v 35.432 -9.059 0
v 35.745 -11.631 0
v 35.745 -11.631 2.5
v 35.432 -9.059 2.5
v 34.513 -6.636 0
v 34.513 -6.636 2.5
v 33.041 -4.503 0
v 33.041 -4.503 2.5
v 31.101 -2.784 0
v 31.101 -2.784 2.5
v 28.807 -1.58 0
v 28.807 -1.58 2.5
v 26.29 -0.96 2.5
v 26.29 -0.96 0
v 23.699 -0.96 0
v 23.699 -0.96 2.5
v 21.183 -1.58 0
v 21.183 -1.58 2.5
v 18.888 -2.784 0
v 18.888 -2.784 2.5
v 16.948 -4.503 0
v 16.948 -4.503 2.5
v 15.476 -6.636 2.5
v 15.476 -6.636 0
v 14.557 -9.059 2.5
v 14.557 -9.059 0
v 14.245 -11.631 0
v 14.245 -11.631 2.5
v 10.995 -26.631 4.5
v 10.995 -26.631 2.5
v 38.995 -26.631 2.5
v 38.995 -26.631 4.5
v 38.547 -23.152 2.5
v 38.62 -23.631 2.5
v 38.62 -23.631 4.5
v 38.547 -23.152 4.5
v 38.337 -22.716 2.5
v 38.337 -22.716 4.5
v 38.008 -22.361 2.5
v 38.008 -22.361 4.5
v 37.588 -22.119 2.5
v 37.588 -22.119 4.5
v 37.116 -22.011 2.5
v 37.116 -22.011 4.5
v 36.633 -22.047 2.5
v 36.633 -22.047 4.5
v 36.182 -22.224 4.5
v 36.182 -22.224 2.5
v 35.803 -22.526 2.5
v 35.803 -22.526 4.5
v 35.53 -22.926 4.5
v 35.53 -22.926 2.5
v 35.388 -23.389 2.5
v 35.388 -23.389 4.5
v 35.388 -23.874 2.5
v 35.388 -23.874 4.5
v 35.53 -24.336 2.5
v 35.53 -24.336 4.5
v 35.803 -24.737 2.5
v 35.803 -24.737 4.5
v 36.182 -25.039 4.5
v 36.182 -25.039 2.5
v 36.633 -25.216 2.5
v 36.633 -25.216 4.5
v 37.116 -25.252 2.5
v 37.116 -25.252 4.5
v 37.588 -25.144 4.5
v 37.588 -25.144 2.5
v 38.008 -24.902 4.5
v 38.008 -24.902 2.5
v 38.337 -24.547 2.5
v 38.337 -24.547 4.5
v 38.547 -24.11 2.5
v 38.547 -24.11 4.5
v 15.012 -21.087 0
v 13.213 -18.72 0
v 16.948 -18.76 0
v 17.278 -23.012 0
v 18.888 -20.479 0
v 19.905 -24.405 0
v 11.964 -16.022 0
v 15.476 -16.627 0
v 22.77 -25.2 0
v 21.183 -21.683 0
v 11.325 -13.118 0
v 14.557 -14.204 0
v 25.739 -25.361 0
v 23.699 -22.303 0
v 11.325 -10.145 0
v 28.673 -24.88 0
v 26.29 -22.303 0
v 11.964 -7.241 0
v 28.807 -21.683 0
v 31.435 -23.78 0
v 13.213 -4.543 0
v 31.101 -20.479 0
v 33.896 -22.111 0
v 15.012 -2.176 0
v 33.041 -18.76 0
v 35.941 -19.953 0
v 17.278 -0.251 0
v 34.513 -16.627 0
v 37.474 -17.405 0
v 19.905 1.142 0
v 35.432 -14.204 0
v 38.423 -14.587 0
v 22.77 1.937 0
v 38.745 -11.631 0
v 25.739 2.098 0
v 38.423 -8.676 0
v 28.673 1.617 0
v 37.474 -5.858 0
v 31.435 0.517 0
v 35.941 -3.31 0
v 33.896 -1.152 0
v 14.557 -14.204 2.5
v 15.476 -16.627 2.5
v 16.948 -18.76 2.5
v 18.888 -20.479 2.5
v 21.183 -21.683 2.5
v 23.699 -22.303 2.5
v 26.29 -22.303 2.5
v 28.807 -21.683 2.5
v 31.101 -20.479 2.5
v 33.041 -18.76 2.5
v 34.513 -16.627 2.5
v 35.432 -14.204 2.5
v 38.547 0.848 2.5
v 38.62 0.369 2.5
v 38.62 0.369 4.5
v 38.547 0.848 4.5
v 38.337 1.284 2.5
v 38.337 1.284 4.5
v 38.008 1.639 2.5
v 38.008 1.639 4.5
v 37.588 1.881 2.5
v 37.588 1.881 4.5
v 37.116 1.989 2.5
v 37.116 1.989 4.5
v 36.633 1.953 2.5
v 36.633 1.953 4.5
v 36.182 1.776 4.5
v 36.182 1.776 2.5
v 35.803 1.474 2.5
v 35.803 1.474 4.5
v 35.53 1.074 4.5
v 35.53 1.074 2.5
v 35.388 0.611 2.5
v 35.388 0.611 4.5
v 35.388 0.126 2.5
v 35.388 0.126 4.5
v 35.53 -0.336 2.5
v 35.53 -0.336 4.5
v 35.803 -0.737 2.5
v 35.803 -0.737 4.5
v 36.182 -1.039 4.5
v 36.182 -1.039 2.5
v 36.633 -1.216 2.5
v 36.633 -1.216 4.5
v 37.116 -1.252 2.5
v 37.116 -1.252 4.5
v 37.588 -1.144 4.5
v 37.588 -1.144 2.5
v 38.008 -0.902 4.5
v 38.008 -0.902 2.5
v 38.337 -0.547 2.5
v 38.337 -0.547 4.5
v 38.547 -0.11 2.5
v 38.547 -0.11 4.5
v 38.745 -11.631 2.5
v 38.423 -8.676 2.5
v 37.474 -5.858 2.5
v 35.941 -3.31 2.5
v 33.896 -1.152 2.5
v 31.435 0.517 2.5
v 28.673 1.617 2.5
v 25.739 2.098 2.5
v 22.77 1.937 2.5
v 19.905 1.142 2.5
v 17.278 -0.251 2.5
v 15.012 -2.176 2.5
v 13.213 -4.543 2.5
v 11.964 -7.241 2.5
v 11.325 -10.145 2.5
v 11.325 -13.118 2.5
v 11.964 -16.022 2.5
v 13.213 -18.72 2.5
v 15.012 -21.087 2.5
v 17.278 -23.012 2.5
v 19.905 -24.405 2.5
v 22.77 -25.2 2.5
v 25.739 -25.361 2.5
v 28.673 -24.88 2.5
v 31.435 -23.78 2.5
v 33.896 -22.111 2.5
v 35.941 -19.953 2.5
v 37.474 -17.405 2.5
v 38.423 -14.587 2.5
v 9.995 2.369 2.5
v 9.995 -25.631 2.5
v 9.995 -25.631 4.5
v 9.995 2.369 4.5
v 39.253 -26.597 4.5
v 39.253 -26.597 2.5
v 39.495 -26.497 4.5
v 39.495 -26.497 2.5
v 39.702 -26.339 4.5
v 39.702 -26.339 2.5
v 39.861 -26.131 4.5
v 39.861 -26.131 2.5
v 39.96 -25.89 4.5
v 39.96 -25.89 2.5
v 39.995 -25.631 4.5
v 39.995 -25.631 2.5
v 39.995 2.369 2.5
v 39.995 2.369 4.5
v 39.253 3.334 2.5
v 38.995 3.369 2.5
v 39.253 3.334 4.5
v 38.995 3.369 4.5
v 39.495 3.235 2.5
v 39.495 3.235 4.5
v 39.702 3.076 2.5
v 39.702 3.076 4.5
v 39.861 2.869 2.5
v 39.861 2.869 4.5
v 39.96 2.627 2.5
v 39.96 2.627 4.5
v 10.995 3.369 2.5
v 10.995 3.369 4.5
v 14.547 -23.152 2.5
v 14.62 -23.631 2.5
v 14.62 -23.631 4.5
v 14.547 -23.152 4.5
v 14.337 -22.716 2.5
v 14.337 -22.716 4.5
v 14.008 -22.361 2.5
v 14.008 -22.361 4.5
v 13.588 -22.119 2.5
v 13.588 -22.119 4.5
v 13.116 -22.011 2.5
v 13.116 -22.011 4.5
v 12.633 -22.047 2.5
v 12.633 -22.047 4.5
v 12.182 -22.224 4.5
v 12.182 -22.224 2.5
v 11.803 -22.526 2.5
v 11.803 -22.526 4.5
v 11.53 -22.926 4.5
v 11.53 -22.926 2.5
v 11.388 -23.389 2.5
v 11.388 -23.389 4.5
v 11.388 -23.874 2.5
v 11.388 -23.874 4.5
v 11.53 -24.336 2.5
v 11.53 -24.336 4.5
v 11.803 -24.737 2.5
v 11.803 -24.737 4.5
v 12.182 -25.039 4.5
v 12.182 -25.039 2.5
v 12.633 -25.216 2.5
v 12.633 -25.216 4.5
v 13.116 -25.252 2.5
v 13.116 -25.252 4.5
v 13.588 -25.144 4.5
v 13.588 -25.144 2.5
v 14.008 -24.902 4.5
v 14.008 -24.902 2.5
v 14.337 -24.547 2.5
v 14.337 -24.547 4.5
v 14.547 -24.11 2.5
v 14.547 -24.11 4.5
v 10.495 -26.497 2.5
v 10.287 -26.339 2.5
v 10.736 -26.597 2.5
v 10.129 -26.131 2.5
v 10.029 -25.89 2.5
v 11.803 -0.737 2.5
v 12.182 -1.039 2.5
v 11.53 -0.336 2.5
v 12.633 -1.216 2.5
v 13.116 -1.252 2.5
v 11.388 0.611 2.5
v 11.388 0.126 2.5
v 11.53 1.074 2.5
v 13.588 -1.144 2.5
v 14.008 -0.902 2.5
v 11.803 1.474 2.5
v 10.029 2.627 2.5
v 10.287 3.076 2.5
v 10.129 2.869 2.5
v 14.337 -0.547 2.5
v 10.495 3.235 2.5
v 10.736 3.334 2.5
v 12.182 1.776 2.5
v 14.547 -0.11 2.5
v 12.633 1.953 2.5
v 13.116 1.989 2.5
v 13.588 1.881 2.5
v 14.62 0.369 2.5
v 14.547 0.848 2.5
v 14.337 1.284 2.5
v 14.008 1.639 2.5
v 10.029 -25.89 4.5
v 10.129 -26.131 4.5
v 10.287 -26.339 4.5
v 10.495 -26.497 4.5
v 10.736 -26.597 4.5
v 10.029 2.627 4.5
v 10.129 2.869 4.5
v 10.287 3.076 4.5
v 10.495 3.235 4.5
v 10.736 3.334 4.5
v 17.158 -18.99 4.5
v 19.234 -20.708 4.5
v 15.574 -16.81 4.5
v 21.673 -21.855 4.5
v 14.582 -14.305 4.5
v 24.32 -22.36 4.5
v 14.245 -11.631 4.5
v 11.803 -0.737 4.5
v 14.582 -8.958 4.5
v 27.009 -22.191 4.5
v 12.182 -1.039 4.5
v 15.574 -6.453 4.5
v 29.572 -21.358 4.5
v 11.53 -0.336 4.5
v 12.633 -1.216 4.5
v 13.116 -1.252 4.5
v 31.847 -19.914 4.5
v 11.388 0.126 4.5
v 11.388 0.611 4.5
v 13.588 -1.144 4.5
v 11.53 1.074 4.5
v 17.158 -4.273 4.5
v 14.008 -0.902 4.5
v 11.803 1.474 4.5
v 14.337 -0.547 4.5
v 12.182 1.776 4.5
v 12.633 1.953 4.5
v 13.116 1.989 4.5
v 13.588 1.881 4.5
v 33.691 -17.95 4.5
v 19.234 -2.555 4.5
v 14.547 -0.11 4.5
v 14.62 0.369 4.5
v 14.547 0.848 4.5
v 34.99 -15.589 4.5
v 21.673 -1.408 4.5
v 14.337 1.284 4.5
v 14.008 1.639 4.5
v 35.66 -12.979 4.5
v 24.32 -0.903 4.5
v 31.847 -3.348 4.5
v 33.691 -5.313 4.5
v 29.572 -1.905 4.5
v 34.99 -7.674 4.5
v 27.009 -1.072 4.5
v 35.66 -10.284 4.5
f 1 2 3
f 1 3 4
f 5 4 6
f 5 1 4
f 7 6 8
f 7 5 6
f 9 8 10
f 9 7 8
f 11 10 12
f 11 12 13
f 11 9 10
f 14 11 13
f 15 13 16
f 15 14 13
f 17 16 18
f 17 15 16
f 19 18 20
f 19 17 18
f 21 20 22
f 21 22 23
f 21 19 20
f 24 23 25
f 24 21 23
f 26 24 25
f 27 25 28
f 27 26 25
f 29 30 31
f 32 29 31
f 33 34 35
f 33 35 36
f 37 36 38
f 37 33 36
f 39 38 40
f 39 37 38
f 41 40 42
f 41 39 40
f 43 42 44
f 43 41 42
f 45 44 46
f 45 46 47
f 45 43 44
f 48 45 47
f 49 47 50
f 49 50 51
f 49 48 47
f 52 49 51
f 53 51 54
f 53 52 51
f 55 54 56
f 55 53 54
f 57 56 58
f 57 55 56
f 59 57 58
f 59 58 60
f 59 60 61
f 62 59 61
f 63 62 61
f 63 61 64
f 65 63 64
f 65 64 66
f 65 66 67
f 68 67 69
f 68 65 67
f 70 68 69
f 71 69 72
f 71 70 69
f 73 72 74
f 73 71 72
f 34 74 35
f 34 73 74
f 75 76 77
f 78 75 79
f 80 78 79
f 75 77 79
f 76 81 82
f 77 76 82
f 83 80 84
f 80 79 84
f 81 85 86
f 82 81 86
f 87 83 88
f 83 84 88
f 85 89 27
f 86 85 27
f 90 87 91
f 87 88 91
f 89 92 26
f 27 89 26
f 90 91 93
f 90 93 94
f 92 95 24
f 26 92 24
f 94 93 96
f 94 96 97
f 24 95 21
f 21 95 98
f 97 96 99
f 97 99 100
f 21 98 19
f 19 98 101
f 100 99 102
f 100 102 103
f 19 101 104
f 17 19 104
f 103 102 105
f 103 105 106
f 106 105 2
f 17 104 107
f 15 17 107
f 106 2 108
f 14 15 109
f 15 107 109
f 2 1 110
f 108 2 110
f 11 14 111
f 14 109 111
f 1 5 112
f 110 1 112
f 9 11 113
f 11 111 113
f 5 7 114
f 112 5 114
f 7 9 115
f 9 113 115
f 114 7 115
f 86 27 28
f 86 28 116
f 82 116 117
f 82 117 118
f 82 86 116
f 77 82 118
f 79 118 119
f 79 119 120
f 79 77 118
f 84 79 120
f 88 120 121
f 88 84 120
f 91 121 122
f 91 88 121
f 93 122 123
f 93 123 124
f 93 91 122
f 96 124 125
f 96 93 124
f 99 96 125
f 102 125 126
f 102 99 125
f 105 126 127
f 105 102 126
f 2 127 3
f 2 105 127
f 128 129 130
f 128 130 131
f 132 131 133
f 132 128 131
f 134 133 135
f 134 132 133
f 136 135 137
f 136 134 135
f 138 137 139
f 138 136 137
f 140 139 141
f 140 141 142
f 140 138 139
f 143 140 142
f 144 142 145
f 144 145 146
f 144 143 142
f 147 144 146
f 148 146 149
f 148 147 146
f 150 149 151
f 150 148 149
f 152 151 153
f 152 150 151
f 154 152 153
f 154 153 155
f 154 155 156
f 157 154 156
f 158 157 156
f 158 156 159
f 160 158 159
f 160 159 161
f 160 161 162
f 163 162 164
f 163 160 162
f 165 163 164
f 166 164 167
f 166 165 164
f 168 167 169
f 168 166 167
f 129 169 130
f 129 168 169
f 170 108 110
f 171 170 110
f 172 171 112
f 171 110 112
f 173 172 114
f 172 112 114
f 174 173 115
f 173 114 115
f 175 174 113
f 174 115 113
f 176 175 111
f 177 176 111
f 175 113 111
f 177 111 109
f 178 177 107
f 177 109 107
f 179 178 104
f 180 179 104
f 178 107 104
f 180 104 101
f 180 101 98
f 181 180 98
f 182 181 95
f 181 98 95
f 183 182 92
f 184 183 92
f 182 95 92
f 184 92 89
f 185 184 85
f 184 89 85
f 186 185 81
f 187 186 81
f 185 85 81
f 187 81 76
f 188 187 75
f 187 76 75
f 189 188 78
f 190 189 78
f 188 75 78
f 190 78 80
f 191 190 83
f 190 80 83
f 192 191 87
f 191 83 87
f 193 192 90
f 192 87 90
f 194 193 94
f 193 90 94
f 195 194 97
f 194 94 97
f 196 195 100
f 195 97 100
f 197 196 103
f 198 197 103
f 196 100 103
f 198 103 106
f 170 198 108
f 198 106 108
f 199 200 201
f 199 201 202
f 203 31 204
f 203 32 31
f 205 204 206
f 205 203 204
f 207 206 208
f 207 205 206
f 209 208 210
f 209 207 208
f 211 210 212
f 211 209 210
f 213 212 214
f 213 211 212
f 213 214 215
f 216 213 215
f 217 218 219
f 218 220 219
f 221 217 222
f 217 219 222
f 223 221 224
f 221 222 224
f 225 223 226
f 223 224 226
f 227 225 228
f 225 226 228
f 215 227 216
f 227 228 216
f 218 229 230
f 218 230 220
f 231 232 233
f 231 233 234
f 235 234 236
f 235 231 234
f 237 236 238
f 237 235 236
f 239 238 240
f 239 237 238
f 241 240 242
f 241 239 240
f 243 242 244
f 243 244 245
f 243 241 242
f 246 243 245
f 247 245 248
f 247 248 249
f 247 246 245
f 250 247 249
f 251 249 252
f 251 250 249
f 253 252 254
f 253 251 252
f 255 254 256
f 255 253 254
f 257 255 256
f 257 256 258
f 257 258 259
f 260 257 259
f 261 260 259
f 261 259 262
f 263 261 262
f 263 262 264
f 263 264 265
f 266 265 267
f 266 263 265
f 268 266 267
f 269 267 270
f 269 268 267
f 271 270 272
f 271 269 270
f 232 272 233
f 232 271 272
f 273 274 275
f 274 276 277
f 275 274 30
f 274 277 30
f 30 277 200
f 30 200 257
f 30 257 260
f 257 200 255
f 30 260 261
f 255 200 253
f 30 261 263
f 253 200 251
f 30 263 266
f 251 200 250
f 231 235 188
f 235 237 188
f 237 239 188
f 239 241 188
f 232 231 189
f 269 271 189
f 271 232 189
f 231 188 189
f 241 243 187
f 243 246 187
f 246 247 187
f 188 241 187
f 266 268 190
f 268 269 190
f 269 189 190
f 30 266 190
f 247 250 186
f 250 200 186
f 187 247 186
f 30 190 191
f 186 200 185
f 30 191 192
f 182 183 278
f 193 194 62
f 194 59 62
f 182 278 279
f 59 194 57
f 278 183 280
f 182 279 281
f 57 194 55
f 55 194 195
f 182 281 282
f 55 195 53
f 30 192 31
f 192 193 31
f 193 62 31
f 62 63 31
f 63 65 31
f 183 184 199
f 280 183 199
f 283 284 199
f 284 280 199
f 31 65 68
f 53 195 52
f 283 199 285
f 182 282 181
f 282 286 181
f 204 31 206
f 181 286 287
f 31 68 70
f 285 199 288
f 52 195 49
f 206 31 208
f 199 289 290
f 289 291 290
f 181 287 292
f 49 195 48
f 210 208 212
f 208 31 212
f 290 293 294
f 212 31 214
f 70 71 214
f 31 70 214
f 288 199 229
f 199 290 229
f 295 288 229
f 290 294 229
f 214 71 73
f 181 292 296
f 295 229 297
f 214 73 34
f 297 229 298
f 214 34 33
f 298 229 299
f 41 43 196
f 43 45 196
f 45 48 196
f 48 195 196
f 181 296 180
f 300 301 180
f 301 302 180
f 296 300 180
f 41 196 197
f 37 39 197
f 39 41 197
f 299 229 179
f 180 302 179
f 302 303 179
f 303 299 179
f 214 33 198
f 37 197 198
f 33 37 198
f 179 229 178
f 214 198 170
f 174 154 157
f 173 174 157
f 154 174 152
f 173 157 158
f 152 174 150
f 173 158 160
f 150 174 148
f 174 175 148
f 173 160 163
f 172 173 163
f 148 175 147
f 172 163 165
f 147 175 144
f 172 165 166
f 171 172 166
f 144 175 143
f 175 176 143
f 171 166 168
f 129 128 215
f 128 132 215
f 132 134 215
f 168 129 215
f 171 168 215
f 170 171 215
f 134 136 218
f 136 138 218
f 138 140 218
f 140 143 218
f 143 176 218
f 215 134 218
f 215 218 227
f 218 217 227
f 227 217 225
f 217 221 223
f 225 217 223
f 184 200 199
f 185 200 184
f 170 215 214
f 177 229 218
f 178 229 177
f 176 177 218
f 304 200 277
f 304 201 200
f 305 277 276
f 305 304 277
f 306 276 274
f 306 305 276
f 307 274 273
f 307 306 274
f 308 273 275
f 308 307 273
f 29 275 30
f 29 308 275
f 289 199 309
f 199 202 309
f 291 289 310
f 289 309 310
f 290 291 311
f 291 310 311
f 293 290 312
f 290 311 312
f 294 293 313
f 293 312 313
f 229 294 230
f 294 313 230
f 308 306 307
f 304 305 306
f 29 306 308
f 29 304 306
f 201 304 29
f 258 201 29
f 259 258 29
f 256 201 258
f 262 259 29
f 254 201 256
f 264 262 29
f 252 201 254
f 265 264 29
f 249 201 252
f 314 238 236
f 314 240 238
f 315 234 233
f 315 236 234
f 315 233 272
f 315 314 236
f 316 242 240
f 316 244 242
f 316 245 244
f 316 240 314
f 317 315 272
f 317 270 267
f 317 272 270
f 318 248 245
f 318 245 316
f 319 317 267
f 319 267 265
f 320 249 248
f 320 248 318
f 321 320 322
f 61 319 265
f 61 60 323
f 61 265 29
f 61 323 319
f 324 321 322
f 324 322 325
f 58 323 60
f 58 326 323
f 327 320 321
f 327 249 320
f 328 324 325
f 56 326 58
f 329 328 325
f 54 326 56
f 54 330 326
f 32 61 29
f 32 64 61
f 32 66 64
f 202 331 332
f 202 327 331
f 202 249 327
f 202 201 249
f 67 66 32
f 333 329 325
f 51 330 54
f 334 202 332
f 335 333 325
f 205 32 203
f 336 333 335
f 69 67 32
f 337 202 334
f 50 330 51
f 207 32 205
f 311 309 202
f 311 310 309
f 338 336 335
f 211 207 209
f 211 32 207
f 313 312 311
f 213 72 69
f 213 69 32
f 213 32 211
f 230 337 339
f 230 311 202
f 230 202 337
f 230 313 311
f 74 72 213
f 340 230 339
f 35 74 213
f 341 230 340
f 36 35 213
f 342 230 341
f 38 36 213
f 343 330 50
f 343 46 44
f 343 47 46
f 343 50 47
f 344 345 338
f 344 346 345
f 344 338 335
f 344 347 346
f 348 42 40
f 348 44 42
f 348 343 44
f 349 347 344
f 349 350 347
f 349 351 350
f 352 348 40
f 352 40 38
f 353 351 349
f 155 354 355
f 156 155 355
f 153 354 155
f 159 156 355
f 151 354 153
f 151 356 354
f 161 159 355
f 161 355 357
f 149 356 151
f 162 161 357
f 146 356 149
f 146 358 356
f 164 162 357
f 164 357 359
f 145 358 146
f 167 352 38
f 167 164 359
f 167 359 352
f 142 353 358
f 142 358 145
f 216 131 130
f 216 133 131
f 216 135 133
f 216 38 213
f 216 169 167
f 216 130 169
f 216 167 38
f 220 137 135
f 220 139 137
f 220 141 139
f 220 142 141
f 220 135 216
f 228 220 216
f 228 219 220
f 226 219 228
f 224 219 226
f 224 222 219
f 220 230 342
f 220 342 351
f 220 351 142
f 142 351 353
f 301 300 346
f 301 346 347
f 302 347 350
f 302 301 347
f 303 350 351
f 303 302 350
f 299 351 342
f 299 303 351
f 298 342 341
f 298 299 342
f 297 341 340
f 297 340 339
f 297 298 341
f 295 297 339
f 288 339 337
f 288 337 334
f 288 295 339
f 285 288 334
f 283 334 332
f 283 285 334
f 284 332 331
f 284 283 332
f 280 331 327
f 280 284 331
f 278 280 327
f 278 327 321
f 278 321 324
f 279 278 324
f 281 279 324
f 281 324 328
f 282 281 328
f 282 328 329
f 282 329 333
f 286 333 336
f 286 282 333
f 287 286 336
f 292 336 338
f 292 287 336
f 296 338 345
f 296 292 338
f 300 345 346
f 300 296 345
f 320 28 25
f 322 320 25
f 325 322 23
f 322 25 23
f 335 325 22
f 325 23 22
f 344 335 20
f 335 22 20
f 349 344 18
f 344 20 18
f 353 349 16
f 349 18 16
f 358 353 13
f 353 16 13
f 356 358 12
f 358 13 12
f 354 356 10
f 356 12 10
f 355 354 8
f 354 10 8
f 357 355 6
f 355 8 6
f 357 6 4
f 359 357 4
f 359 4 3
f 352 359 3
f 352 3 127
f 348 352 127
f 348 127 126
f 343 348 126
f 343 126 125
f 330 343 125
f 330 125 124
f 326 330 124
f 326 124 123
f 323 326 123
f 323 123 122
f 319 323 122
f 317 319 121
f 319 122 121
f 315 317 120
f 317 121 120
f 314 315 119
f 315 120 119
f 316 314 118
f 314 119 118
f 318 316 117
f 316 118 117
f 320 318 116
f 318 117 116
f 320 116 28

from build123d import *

# Parameters (mm, degrees)
ESQUISSE1_R             = 13.75
ESQUISSE1_R_2           = 10.75
BOSS_EXTRU_1_DEPTH      = 2.5
ESQUISSE2_W             = 30
ESQUISSE2_H             = 30
ESQUISSE2_R             = 1.625
BOSS_EXTRU_2_DEPTH      = 2
ESQUISSE3_R             = 10.75
ENL_V_MAT_EXTRU_1_DEPTH = 23
CONG_1_R                = 1


with BuildPart() as part:
    # Esquisse1 → Boss.-Extru.1 (new body)
    with BuildSketch(Plane.XY):
        with Locations((24.994563159, -11.631436553)):
            Circle(ESQUISSE1_R)
        with Locations((24.994563159, -11.631436553)):
            Circle(ESQUISSE1_R_2, mode=Mode.SUBTRACT)
    extrude(amount=BOSS_EXTRU_1_DEPTH)

    # Esquisse2 → Boss.-Extru.2 (add)
    with BuildSketch(Plane.XY.offset(2.5)):
        with Locations((24.994563159, -11.631436553)):
            Rectangle(ESQUISSE2_W, ESQUISSE2_H)
        with Locations((12.994563159, 0.368563447)):
            Circle(ESQUISSE2_R, mode=Mode.SUBTRACT)
        with Locations((36.994563159, 0.368563447)):
            Circle(ESQUISSE2_R, mode=Mode.SUBTRACT)
        with Locations((12.994563159, -23.631436553)):
            Circle(ESQUISSE2_R, mode=Mode.SUBTRACT)
        with Locations((36.994563159, -23.631436553)):
            Circle(ESQUISSE2_R, mode=Mode.SUBTRACT)
    extrude(amount=BOSS_EXTRU_2_DEPTH)

    # Esquisse3 → Enlèv. mat.-Extru.1 (cut)
    with BuildSketch(Plane(origin=(0, 0, 0), x_dir=(-1, 0, 0), z_dir=(0, 0, -1))):
        with Locations((-24.994563159, -11.631436553)):
            Circle(ESQUISSE3_R)
    extrude(amount=-ENL_V_MAT_EXTRU_1_DEPTH, mode=Mode.SUBTRACT)

    # Congé1
    cong_1_edges = [part.edges().sort_by_distance(p)[0] for p in [
        (9.994563159, 3.368563447, 3.5),
        (9.994563159, -26.631436553, 3.5),
        (39.994563159, -26.631436553, 3.5),
        (39.994563159, 3.368563447, 3.5),
    ]]
    fillet(cong_1_edges, radius=CONG_1_R)


solid = part.part
